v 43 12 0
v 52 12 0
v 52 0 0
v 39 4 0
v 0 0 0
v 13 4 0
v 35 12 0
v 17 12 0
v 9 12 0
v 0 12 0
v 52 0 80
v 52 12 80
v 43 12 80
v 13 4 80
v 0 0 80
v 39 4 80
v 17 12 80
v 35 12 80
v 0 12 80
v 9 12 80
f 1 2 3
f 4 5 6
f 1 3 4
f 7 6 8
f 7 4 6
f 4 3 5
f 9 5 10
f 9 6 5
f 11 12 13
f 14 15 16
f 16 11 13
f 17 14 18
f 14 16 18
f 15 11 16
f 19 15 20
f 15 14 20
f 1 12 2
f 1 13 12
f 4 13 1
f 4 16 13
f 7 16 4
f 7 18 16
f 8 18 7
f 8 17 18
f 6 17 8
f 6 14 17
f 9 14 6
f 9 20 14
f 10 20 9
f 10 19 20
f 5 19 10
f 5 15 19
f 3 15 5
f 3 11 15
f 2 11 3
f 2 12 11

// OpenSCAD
$fn = 32;

// ----------------------------------------------------------------------
// V guide rail: doublev, 52 mm wide
// ----------------------------------------------------------------------

// --- parameters (mm) ---
rail_w = 52;              // rail width, X
base_t = 12;              // base plate thickness
v_depth = 8;              // V feature depth / height
v_half_w = 8;             // half width of the V at the base face
plate_t = 80;             // rail length, Z (the extrusion height)
groove_off = 13;          // offset of each groove from the centreline

centre_x = rail_w / 2;  // rail centreline
groove_a = centre_x - groove_off;  // axis of the first groove
groove_b = centre_x + groove_off;  // axis of the second groove

profile = [[0, 0], [52, 0], [52, 12], [43, 12], [39, 4], [35, 12], [17, 12], [13, 4], [9, 12], [0, 12]];  // primary outline, 10 points, counter clockwise

// --- the one profile operation ---
linear_extrude(height = plate_t) polygon(points = profile);
